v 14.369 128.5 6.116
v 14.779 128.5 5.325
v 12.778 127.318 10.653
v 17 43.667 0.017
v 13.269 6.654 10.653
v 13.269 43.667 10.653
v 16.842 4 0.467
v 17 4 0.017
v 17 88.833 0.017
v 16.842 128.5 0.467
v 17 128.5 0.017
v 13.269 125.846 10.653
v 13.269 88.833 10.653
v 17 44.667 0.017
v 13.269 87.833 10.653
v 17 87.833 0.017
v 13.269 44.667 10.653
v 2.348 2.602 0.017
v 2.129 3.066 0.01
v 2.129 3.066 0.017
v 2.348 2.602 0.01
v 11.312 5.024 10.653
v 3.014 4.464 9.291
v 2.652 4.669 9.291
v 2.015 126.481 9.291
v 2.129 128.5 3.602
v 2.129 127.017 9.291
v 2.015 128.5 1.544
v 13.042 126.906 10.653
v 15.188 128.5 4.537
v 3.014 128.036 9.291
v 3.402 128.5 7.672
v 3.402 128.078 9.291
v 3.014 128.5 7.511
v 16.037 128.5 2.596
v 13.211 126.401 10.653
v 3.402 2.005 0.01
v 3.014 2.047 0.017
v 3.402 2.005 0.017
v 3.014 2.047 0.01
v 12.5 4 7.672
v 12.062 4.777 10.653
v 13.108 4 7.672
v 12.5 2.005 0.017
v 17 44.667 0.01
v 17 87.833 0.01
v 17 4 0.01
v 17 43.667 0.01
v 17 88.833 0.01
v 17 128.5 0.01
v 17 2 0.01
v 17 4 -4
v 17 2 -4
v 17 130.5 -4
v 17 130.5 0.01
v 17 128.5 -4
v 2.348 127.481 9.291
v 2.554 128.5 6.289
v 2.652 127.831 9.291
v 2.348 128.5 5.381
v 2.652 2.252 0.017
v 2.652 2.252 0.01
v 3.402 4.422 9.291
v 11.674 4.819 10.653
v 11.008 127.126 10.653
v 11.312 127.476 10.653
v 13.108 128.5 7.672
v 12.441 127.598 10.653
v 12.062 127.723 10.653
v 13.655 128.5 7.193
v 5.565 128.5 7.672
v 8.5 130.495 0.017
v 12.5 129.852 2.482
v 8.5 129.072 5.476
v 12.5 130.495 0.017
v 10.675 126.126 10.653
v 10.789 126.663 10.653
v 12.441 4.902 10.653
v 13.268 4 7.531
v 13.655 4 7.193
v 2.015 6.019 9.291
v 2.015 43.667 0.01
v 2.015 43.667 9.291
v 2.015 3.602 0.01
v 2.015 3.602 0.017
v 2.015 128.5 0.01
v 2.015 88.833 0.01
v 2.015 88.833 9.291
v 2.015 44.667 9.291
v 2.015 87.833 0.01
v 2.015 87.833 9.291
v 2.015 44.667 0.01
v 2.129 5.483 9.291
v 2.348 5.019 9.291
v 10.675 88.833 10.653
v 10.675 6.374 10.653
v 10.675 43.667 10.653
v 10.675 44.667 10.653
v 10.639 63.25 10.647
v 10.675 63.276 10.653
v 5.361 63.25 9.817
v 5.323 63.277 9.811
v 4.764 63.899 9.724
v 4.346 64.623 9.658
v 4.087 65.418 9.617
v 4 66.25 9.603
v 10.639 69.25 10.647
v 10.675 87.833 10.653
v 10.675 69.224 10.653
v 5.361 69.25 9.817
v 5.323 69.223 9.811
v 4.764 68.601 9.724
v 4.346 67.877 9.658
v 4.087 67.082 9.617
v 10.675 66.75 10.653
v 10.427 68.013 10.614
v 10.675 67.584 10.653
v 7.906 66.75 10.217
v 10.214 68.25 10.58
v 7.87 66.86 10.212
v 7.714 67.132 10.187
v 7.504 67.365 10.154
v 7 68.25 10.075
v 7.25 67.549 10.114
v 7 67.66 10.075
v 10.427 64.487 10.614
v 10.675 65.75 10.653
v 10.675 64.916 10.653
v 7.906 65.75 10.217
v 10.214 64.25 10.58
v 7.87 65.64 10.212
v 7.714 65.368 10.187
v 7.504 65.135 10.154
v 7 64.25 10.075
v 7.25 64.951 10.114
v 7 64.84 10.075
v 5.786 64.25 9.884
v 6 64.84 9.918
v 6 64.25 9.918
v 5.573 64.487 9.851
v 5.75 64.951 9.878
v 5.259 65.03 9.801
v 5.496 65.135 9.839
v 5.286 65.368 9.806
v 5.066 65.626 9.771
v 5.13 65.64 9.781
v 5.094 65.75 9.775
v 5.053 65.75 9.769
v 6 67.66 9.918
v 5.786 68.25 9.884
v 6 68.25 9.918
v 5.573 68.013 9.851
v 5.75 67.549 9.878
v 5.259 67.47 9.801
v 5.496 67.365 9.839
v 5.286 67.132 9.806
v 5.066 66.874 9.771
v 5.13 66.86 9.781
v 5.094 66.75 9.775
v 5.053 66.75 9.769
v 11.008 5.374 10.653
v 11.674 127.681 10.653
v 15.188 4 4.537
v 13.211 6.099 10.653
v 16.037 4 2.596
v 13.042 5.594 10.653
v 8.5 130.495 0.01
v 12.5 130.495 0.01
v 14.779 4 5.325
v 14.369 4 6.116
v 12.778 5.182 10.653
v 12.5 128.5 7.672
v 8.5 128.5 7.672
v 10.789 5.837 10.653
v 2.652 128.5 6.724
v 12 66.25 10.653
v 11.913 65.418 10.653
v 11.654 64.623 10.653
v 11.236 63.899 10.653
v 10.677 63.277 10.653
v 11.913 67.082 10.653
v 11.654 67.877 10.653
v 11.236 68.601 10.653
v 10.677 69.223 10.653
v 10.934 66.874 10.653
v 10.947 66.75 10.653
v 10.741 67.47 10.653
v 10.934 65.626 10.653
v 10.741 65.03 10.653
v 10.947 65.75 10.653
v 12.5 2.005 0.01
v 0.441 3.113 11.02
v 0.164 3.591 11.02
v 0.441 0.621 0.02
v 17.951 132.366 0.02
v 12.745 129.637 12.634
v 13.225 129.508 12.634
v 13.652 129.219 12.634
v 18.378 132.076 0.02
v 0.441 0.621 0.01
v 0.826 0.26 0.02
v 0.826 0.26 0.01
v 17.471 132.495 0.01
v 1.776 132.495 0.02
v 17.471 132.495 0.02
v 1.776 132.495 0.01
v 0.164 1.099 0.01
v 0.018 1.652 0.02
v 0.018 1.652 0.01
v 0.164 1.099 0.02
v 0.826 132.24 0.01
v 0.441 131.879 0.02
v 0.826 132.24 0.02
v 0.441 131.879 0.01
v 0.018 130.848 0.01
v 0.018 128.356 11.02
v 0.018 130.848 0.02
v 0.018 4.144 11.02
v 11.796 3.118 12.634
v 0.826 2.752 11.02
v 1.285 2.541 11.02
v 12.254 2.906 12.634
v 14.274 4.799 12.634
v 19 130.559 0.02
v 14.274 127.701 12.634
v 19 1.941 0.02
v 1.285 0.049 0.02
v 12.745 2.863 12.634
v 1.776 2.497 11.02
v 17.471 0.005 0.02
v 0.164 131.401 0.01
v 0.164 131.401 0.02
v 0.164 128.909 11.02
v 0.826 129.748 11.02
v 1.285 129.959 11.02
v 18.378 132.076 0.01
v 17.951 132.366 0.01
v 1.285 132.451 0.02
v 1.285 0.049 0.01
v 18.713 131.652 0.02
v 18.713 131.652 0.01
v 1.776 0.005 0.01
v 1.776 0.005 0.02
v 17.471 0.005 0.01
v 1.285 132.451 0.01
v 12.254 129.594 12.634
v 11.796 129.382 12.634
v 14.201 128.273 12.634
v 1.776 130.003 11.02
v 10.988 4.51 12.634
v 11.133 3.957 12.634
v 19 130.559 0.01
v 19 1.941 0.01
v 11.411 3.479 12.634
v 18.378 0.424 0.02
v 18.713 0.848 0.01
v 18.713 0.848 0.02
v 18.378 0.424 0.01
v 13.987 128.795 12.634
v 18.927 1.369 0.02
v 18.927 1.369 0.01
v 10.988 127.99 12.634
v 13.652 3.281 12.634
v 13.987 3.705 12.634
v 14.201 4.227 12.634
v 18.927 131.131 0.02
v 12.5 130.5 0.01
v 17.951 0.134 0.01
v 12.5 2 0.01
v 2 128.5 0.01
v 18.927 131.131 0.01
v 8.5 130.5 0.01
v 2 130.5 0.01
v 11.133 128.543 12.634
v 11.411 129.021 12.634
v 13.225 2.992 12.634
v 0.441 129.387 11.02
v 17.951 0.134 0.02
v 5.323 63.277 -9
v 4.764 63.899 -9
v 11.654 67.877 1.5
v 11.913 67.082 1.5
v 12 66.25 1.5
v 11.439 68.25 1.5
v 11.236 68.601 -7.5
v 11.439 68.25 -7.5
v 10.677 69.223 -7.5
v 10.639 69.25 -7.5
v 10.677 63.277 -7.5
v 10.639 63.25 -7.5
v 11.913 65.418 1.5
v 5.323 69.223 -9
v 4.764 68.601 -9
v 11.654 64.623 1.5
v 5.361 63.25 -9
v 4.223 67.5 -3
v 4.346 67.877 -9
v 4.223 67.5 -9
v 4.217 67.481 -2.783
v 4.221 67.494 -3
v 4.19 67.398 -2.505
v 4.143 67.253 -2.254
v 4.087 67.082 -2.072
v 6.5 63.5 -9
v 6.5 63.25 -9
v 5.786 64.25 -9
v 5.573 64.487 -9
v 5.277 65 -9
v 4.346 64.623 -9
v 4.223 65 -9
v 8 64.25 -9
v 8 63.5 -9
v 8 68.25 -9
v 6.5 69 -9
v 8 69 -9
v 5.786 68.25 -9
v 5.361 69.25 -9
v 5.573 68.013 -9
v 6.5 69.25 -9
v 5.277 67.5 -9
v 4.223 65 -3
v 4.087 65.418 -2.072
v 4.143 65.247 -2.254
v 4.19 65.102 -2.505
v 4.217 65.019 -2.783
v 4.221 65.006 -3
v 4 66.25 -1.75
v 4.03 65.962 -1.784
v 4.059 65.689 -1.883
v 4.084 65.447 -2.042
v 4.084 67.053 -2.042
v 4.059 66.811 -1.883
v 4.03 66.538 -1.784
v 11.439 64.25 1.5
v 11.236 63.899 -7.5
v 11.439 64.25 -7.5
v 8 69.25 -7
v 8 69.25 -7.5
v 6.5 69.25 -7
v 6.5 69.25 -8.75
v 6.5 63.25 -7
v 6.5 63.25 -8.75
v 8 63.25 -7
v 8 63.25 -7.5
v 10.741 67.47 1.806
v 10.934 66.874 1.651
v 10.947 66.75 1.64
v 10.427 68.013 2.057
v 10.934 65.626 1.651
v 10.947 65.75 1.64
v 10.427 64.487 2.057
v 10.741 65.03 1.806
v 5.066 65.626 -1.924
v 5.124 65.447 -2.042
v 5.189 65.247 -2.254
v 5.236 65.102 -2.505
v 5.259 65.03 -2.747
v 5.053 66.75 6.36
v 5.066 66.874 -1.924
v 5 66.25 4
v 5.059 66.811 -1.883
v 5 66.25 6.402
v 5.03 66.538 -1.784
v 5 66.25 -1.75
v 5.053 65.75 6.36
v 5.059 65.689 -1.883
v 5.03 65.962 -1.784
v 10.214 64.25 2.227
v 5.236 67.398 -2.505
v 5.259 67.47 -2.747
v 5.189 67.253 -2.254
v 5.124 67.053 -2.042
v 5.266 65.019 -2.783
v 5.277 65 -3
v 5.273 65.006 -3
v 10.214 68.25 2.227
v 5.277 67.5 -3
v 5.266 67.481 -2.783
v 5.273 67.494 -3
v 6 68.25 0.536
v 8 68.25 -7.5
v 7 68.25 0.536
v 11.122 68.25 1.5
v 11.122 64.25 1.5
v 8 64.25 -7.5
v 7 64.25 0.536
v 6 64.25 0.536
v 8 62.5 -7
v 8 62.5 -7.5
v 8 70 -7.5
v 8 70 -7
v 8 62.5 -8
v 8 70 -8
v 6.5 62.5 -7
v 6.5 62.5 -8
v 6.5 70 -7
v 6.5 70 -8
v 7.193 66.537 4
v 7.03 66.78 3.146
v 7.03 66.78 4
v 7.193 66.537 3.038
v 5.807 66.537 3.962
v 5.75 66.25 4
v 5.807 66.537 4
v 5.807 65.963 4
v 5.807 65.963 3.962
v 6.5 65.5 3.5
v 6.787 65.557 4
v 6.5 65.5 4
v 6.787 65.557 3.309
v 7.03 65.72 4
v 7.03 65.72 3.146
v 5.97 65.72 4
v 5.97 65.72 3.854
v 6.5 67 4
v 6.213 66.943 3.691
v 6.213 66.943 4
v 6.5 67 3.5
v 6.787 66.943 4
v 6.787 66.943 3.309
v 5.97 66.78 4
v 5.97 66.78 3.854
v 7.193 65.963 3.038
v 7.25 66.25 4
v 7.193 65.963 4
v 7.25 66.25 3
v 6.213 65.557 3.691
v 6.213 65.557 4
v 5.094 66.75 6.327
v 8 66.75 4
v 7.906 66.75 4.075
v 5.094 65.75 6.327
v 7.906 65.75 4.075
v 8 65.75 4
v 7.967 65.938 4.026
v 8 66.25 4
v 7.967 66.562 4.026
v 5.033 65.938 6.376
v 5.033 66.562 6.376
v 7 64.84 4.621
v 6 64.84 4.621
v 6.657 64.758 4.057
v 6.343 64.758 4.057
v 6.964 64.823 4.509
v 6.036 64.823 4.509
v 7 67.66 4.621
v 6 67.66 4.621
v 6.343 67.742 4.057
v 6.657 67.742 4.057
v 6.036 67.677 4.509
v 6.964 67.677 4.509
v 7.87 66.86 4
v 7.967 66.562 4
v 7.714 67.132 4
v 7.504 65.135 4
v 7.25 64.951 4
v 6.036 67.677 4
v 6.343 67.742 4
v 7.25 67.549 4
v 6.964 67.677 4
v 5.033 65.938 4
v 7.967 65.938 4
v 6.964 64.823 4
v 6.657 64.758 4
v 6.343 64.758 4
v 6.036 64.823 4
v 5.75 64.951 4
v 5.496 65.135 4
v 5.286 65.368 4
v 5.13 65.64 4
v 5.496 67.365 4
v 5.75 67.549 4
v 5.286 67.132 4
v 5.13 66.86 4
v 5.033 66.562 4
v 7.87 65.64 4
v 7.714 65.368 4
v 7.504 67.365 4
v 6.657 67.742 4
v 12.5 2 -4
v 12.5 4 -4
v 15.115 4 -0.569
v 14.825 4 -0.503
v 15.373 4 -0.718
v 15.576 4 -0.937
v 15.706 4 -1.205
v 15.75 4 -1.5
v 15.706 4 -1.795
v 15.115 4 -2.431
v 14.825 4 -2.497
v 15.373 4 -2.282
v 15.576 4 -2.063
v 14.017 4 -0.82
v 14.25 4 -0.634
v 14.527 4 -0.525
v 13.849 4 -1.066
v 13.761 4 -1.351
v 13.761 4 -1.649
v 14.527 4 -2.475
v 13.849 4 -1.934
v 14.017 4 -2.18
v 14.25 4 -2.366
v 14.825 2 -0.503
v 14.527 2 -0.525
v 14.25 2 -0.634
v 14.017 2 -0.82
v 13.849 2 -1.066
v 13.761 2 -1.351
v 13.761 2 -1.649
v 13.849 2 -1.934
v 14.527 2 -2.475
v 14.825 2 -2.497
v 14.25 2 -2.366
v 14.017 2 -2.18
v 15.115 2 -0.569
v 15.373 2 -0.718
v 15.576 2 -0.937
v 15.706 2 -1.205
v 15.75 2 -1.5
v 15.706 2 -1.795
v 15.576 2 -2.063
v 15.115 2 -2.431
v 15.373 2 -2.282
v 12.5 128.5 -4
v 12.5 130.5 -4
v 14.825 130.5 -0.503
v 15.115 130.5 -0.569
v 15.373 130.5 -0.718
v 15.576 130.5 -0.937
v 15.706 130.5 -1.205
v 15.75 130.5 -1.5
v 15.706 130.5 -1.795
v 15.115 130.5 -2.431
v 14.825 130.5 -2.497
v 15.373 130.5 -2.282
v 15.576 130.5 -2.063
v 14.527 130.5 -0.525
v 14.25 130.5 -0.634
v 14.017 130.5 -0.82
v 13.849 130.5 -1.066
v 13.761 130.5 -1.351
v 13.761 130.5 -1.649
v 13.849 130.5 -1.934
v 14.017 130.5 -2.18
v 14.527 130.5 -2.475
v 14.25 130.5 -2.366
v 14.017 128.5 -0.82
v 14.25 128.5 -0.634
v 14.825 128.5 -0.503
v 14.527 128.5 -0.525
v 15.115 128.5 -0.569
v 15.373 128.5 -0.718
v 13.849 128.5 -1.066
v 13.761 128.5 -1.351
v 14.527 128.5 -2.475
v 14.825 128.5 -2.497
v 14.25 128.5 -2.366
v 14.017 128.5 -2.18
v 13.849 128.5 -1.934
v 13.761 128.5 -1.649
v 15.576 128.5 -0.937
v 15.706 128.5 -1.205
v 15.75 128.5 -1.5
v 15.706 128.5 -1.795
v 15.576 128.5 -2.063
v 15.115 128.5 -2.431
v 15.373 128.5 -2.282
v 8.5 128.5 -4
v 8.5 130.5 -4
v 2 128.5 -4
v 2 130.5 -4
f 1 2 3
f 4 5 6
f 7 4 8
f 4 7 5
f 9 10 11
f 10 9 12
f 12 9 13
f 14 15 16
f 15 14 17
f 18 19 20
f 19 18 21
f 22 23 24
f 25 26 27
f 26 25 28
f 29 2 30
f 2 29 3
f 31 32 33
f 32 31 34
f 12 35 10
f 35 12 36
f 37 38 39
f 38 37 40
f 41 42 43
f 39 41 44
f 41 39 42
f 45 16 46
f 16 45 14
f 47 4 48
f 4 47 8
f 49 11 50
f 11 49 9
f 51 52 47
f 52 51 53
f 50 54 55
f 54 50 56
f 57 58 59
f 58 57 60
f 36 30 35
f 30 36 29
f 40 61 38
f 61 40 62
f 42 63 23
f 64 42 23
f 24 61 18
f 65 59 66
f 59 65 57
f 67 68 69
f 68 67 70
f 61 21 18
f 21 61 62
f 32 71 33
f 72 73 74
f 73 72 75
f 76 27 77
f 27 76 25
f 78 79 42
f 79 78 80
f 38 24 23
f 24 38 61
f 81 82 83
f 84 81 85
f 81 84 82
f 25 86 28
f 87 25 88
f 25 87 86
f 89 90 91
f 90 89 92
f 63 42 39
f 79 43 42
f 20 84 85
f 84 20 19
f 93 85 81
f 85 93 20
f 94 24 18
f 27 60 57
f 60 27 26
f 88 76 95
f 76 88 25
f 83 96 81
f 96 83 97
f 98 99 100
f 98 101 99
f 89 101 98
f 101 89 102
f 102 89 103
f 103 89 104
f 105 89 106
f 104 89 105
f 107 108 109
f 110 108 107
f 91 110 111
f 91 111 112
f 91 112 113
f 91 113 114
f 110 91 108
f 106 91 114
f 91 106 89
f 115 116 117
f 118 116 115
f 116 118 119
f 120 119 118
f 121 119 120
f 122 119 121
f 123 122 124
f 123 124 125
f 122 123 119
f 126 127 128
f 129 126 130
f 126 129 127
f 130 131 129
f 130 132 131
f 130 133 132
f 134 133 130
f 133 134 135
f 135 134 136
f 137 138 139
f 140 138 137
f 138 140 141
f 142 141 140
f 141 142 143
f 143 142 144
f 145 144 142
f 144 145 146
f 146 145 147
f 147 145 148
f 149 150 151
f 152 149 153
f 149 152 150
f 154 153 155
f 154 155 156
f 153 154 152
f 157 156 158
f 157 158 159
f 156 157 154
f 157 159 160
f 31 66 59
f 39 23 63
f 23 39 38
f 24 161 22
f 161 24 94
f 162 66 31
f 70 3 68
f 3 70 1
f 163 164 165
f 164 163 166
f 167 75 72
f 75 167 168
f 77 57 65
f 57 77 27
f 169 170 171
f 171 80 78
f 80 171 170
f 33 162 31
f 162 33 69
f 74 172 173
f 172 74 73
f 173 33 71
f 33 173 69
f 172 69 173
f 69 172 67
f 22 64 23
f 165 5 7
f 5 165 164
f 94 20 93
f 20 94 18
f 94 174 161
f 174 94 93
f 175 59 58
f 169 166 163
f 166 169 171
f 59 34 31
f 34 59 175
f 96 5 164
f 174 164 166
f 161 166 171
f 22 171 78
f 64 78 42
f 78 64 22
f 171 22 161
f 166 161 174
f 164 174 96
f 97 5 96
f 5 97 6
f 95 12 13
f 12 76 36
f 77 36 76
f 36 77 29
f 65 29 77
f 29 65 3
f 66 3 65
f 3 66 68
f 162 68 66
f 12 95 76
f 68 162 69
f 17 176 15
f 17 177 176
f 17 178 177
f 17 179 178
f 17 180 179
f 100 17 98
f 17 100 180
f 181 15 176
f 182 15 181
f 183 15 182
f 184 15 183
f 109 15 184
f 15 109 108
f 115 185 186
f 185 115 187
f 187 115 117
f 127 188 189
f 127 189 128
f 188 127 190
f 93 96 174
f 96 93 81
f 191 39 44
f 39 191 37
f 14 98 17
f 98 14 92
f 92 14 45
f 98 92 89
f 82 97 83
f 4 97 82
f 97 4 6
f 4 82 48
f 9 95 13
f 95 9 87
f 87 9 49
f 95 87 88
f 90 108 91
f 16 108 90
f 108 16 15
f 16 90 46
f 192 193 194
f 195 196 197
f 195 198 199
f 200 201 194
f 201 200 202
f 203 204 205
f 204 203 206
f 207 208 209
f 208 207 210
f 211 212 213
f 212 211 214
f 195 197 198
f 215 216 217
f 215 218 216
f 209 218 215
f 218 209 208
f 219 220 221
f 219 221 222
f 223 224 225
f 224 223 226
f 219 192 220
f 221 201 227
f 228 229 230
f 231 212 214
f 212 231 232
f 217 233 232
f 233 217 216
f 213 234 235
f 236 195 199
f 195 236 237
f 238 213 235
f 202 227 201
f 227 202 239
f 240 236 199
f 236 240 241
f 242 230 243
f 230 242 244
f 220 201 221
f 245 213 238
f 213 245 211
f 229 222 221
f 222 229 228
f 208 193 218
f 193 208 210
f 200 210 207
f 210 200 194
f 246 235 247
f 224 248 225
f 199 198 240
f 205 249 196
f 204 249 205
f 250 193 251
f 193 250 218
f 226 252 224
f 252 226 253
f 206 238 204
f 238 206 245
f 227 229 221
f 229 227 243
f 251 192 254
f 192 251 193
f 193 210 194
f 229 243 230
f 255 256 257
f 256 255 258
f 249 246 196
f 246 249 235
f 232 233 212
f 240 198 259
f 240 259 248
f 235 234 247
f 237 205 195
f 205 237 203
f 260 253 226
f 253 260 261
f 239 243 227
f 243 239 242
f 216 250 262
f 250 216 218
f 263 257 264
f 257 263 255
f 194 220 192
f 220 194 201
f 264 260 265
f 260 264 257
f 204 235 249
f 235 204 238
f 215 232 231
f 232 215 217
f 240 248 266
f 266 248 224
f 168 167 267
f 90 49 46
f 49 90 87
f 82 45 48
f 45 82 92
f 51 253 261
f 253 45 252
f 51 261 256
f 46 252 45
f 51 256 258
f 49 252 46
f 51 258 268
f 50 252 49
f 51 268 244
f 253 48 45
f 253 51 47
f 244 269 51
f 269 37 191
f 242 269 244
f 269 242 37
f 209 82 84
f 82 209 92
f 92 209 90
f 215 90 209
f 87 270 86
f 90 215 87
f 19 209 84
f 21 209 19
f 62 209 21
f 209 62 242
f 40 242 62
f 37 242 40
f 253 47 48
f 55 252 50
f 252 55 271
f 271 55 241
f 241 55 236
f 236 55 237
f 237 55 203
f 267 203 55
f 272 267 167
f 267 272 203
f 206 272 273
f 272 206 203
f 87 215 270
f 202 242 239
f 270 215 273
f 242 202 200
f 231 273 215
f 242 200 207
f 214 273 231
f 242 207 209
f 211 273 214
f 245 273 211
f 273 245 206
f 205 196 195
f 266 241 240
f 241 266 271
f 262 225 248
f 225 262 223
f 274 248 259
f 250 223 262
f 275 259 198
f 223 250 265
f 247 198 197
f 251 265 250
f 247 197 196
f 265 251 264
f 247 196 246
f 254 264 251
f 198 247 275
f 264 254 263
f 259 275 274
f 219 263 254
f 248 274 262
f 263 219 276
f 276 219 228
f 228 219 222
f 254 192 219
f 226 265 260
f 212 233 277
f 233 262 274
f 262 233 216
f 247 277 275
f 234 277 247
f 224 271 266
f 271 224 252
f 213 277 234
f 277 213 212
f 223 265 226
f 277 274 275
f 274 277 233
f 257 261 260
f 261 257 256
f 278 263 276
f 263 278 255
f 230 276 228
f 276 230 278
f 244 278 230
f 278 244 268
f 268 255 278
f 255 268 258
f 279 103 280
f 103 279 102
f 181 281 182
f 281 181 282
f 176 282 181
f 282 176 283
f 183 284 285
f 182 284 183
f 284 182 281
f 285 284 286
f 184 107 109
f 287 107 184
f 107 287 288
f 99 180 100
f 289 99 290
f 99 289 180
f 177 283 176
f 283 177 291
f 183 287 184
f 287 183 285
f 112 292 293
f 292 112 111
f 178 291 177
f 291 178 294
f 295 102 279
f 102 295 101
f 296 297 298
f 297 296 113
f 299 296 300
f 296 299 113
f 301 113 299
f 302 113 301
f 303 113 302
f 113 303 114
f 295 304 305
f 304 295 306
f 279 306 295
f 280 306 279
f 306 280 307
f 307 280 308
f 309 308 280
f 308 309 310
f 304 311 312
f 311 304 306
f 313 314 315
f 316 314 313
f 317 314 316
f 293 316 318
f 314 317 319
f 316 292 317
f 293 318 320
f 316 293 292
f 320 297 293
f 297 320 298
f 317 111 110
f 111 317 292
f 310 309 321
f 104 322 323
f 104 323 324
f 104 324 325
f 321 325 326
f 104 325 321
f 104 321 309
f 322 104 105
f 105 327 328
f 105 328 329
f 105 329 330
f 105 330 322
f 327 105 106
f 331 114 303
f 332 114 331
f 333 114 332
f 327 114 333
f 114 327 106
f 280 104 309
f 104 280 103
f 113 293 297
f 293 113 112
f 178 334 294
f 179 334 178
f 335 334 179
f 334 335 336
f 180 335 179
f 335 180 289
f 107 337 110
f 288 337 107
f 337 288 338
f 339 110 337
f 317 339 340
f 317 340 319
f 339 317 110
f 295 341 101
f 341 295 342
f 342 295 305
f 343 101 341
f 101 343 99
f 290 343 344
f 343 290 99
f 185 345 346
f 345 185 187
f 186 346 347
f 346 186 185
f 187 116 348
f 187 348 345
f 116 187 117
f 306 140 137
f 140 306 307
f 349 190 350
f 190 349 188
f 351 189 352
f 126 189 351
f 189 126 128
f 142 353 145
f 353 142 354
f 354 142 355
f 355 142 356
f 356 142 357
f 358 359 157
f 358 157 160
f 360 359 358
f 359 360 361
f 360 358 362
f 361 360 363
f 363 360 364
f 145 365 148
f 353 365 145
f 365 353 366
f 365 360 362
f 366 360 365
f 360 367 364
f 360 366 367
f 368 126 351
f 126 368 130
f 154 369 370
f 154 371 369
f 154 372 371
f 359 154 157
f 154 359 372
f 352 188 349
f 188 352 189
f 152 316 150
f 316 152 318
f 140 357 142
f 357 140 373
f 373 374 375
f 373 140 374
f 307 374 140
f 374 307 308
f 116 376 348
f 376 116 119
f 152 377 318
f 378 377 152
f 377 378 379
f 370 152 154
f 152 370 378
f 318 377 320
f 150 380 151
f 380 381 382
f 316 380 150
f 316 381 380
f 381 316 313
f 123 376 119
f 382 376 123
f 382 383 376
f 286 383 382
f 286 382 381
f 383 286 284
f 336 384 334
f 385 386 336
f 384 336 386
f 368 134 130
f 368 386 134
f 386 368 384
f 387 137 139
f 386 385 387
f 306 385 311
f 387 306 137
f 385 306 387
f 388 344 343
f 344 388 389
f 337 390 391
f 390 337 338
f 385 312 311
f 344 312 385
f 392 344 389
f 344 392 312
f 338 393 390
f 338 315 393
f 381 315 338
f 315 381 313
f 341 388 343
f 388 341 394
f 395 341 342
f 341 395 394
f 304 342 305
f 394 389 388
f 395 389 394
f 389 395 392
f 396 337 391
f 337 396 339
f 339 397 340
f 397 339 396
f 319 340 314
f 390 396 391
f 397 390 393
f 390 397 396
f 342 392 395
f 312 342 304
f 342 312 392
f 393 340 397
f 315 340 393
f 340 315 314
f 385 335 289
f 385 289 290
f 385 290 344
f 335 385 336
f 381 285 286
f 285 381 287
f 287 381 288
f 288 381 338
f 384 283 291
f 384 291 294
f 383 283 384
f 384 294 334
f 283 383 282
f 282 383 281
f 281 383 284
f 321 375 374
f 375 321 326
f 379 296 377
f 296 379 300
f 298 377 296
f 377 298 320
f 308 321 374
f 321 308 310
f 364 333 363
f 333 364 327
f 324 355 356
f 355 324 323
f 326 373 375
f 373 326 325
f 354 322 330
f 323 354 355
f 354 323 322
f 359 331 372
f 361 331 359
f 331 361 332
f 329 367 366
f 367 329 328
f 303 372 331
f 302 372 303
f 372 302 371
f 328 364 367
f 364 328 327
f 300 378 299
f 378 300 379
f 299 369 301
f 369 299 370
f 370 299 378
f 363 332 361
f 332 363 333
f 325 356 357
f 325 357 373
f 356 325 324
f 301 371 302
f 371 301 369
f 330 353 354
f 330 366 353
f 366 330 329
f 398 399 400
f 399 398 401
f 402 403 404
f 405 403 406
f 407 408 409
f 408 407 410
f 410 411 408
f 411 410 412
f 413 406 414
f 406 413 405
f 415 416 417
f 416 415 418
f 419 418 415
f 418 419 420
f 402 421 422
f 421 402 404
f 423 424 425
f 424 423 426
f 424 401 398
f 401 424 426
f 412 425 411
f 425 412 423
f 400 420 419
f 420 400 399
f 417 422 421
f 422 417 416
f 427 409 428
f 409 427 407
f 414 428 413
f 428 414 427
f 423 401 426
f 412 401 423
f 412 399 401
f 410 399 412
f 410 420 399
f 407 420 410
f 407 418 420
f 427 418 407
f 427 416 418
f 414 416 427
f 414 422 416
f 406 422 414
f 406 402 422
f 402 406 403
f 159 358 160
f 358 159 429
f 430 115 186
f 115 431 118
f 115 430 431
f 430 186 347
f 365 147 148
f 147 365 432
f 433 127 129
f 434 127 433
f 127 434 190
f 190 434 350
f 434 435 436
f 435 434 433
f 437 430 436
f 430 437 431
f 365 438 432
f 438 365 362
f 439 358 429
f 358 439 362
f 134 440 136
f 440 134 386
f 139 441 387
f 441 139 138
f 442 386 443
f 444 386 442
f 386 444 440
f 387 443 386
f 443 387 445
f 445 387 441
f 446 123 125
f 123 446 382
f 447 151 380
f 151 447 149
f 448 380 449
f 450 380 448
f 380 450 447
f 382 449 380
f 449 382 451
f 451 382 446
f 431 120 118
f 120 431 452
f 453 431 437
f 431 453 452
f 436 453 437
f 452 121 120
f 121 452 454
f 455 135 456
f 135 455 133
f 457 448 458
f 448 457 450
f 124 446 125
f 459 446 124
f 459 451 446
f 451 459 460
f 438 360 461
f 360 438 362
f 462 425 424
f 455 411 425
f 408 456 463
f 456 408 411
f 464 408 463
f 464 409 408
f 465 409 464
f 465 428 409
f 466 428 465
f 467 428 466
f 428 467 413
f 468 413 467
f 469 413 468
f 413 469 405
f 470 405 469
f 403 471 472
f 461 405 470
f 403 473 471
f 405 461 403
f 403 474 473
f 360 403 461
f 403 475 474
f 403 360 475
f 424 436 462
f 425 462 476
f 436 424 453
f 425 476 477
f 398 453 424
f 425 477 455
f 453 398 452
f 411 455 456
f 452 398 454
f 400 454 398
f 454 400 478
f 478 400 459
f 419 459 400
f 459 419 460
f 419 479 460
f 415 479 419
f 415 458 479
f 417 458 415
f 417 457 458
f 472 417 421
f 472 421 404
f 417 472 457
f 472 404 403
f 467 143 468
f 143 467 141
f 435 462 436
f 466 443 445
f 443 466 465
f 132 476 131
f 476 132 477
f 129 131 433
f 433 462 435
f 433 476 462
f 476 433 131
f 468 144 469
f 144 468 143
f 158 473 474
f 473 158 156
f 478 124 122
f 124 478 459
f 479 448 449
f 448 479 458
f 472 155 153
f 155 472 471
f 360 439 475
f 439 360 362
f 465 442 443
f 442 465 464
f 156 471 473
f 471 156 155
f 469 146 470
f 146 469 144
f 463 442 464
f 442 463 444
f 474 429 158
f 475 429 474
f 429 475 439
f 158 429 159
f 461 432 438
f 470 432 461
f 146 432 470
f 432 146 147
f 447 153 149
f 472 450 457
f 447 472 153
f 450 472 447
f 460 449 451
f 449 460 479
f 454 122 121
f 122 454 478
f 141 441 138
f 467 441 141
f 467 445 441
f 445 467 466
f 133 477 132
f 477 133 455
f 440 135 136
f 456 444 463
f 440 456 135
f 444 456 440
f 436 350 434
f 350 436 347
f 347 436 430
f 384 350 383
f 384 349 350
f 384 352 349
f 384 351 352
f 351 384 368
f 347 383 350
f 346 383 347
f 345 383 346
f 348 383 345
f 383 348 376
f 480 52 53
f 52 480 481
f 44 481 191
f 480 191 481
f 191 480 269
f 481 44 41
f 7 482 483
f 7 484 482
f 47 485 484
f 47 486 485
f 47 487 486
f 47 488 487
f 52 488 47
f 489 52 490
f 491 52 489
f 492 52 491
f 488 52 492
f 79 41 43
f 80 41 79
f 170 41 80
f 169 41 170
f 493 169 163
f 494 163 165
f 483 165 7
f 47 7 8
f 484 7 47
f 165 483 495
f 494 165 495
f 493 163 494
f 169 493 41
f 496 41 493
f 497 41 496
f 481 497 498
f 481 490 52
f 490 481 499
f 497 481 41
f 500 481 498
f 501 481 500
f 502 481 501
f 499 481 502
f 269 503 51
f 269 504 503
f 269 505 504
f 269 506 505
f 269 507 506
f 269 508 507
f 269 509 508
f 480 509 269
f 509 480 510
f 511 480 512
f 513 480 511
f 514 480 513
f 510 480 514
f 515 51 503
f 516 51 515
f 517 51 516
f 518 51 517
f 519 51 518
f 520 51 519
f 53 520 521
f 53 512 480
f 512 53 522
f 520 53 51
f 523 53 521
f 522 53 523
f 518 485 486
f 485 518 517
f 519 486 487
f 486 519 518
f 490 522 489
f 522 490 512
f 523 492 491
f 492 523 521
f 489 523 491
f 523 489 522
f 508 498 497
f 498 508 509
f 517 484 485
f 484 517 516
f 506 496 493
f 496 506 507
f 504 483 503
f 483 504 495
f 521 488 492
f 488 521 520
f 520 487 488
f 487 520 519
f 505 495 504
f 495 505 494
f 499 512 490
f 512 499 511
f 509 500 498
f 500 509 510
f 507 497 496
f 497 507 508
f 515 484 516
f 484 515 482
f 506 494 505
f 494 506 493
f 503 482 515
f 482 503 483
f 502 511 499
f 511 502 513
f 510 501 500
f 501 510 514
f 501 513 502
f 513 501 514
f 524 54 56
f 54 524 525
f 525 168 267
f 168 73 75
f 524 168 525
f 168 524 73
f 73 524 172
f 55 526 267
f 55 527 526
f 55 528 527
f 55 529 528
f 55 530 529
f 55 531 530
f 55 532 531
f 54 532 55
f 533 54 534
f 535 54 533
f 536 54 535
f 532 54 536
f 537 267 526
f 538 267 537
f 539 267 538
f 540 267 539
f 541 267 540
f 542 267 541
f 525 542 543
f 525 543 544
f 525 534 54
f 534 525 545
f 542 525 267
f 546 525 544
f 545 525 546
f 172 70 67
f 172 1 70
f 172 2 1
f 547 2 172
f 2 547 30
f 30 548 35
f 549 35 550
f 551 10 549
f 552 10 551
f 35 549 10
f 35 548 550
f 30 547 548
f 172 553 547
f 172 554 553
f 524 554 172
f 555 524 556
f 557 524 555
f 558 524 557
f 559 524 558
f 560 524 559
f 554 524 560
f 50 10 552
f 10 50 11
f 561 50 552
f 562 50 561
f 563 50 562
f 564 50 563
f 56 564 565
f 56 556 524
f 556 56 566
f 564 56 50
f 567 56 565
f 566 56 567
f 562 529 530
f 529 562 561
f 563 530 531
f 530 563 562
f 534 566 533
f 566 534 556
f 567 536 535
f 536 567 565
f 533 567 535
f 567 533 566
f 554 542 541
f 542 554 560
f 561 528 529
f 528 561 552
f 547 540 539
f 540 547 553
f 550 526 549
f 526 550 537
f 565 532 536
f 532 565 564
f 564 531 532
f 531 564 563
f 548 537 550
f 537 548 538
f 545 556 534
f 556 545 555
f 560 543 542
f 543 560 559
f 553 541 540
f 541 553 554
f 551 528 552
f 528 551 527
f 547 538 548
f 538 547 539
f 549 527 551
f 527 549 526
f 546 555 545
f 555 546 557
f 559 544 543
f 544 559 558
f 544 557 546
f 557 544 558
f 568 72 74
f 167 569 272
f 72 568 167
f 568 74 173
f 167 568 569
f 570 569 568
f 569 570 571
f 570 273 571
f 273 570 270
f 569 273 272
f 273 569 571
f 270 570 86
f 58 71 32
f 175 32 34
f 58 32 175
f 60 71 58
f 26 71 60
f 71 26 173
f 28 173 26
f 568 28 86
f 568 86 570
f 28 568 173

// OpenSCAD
//measures are in millimeters
//(feel free to cocnvert them to attoparsecs)
AY=132.5;
AX=19.0;
BY=127.5;
BLX=14.5;
EZ=11.0;
FLZ=14.0;
H=12.75;
SHAFT_OFF_Y=AY/2;
SHAFT_OFF_X=8.0; //???
CLIP_X=2;
CLIP_Y=0.75;
CLIP_H=3*CLIP_Y;
CORNER_RADIUS=2;
SHAFT_X=8.0;
SHAFT_Y=6.0;
SHAFT_LENGTH=9.0;
SHAFT_THICKNESS=1.0;
SHAFT_CLIP_WIDTH=3.0;
SHAFT_CLIP_THICKNESS=0.75;
SHAFT_CLIP_HEIGHT=2.0;
SHAFT_CLIP_SLOPE_DEPTH=1.0;
SHAFT_CLIP_ANGLE=45;
SHAFT_END_CUTOUT_HEIGHT=1.5;
SHAFT_LARGE_SLOT_TO_BASE=1.5;
SHAFT_SMALL_SLOT_LENGTH=7.25;
SHAFT_SMALL_SLOT_WIDTH=2.5;
SHAFT_SPRING_HOLDER_WIDTH=3.0;
SHAFT_SPRING_HOLDER_TO_BASE=4.0;
SHAFT_SPRING_GUIDE_WIDTH=1.0;
SHAFT_SPRING_GUIDE_SIDES_HEIGHT=3.5;
STRUT_THICKNESS=1;
STRUT_HEIGHT=3;
STRUT_SPACING=1;
SHAFT_SPRING_HOLDER_NIPPLE_HEIGHT=1;
SHAFT_SPRING_HOLDER_NIPPLE_RADIUS=0.75;

WIRE_HOLDER_HEIGHT=4.0;
WIRE_HOLDER_WIDTH=4.5;
WIRE_DIAMETER=2.0;
WIRE_HOLE_OFF_Z=0.5;

MYSTERIOUS_TAB_WIDTH=6.5;
MYSTERIOUS_TAB_HEIGHT=5.5;

SHAFT_SMALL_SLOT_BEVEL=0.5;

WallThickness=2.0;
ClipWidth=2.2;
ClipDepth=0.75;

//ascfront=FLZ/sqrt(pow(FLZ,2)-pow(H,2));
//asctop=(H-EZ)/sqrt(pow(BLX,2)-pow((H-EZ),2));

alpha=asin((H-EZ)/BLX);
beta=asin(H/FLZ);
gamma=90-asin((0.5*(AY-BY))/EZ);

module keycap(){
	scale([AX/(AX+2*CORNER_RADIUS),AY/(AY+2*CORNER_RADIUS),1])
	translate([CORNER_RADIUS,CORNER_RADIUS,0.01])
	minkowski(){
		difference(){
			cube([AX,AY,H]);
			rotate(a=gamma,v=[1,0,0]) cube([200,200,200]);
			translate([0,AY,0]) rotate(a=90-gamma,v=[1,0,0]) cube([200,200,200]);
			translate([0,0,EZ]) rotate(a=-alpha,v=[0,1,0]) translate([-100,0,0]) cube([200,200,200]);
			translate([AX,0,0]) rotate(a=beta-90,v=[0,1,0]) cube([200,200,200]);
		}
		cylinder(h=0.01,r=CORNER_RADIUS,$fs=0.6);
		//rotate(a=90,v=[1,0,0]) cylinder(h=0.01,r=1,$fs=0.3);
	}
}

module shaft(){
	spring_guide_length = SHAFT_X-SHAFT_THICKNESS-SHAFT_SPRING_HOLDER_WIDTH;
	spring_guide_height = SHAFT_SPRING_HOLDER_TO_BASE-SHAFT_LARGE_SLOT_TO_BASE;
	translate([0,0,-SHAFT_LENGTH]) difference(){
		union(){
			difference(){
				union(){
					difference(){
						intersection(){
							cylinder(h=200,r=SHAFT_X/2,$fs=0.3);
							translate([-SHAFT_X/2,-SHAFT_Y/2,0]) cube([SHAFT_X,SHAFT_Y,200]);
						}
						intersection(){
							cylinder(h=200,r=SHAFT_X/2-SHAFT_THICKNESS,$fs=0.3);
							translate([-SHAFT_X/2+SHAFT_THICKNESS,-SHAFT_Y/2+SHAFT_THICKNESS,0]) cube([SHAFT_X-2*SHAFT_THICKNESS,SHAFT_Y-2*SHAFT_THICKNESS,200]);
						}
					}
					translate([-SHAFT_CLIP_WIDTH/2, -SHAFT_CLIP_THICKNESS-SHAFT_Y/2,0]) cube([SHAFT_CLIP_WIDTH/2, SHAFT_CLIP_THICKNESS,SHAFT_CLIP_HEIGHT]);
					translate([-SHAFT_CLIP_WIDTH/2, SHAFT_Y/2,0]) cube([SHAFT_CLIP_WIDTH/2, SHAFT_CLIP_THICKNESS,SHAFT_CLIP_HEIGHT]);
				}
				translate([-SHAFT_CLIP_WIDTH/2, -SHAFT_CLIP_THICKNESS-SHAFT_Y/2+SHAFT_CLIP_SLOPE_DEPTH,0]) rotate(a=90+SHAFT_CLIP_ANGLE,v=[1,0,0]) cube([SHAFT_CLIP_WIDTH/2,200,200]);
				translate([-SHAFT_CLIP_WIDTH/2, SHAFT_Y/2+SHAFT_CLIP_THICKNESS-SHAFT_CLIP_SLOPE_DEPTH,0]) mirror([0,1,0]) rotate(a=90+SHAFT_CLIP_ANGLE,v=[1,0,0]) cube([SHAFT_CLIP_WIDTH/2,200,200]);
				translate([0,-100,0]) cube([200,200,SHAFT_END_CUTOUT_HEIGHT]);
				translate([0,-SHAFT_Y/2+SHAFT_THICKNESS,0]) cube([200,SHAFT_Y-SHAFT_THICKNESS*2,SHAFT_LENGTH+SHAFT_LARGE_SLOT_TO_BASE]);
				//small slot cutout
				translate([0,-SHAFT_SMALL_SLOT_WIDTH/2,0]){
					mirror([1,0,0]) cube([200,SHAFT_SMALL_SLOT_WIDTH,SHAFT_SMALL_SLOT_LENGTH-0.5*SHAFT_SMALL_SLOT_WIDTH]);
				}
				//small slot cutout
				translate([0,0,SHAFT_SMALL_SLOT_LENGTH-0.5*SHAFT_SMALL_SLOT_WIDTH]) rotate(a=-90,v=[0,1,0]) cylinder(r=SHAFT_SMALL_SLOT_WIDTH/2,h=SHAFT_X/2,$fs=0.3);
			}
			//spring holder
			translate([-SHAFT_X/2+SHAFT_SPRING_HOLDER_WIDTH/2+SHAFT_THICKNESS,0,SHAFT_LENGTH+SHAFT_SPRING_HOLDER_TO_BASE]) cylinder(r=SHAFT_SPRING_HOLDER_WIDTH/2,h=200,$fs=0.3);
			intersection(){
				translate([-SHAFT_X/2+SHAFT_SPRING_HOLDER_WIDTH/2+SHAFT_THICKNESS,0,SHAFT_LENGTH+SHAFT_SPRING_HOLDER_TO_BASE-SHAFT_SPRING_HOLDER_NIPPLE_HEIGHT]) cylinder(r=SHAFT_SPRING_HOLDER_NIPPLE_RADIUS,h=200,$fs=0.3);
				translate([0,0,SHAFT_LENGTH+SHAFT_SPRING_HOLDER_TO_BASE-SHAFT_SPRING_HOLDER_NIPPLE_HEIGHT*1.5]) rotate(v=[0,1,0], a=atan(SHAFT_SPRING_HOLDER_NIPPLE_HEIGHT/(SHAFT_SPRING_HOLDER_NIPPLE_RADIUS*2))) translate([-100,-100,0]) cube(200,200,200);
			}
			intersection(){
				difference(){
					translate([SHAFT_X/2-SHAFT_THICKNESS,-0.5*SHAFT_SPRING_GUIDE_WIDTH,SHAFT_LENGTH+SHAFT_LARGE_SLOT_TO_BASE]) mirror([1,0,0]) cube([200,SHAFT_SPRING_GUIDE_WIDTH,200]);
					translate([-SHAFT_X/2+SHAFT_SPRING_HOLDER_WIDTH+SHAFT_THICKNESS,-0.5*SHAFT_SPRING_GUIDE_WIDTH,SHAFT_LENGTH+SHAFT_SPRING_HOLDER_TO_BASE])
					mirror([1,0,0]) rotate(a=90-asin(spring_guide_height/spring_guide_length),v=[0,1,0]) mirror([0,0,1]) translate([0,0,-100]) cube([200,SHAFT_SPRING_GUIDE_WIDTH,200]);
				}
				cube([SHAFT_X-SHAFT_THICKNESS,SHAFT_Y,200],center=true);
			}
			//side spring guides
			difference(){
				translate([-SHAFT_X/2+SHAFT_THICKNESS+(SHAFT_SPRING_HOLDER_WIDTH-SHAFT_SPRING_GUIDE_WIDTH)/2,-SHAFT_Y/2+SHAFT_THICKNESS,SHAFT_LENGTH+SHAFT_SPRING_HOLDER_TO_BASE-SHAFT_SPRING_GUIDE_SIDES_HEIGHT]) cube([SHAFT_SPRING_GUIDE_WIDTH,SHAFT_Y-2*SHAFT_THICKNESS,EZ-SHAFT_SPRING_HOLDER_TO_BASE+SHAFT_SPRING_GUIDE_SIDES_HEIGHT]);
				translate([-SHAFT_X/2+SHAFT_THICKNESS+(SHAFT_SPRING_HOLDER_WIDTH-SHAFT_SPRING_GUIDE_WIDTH)/2,-SHAFT_SPRING_HOLDER_WIDTH/2,SHAFT_LENGTH+SHAFT_SPRING_HOLDER_TO_BASE]) rotate(a=-asin(((SHAFT_Y-SHAFT_SPRING_HOLDER_WIDTH)/2-SHAFT_THICKNESS)/SHAFT_SPRING_GUIDE_SIDES_HEIGHT),v=[1,0,0]) translate([0,0,-100]) cube([SHAFT_SPRING_GUIDE_WIDTH,200,200]);
			}
			difference(){
				translate([-SHAFT_X/2+SHAFT_THICKNESS+(SHAFT_SPRING_HOLDER_WIDTH-SHAFT_SPRING_GUIDE_WIDTH)/2,-SHAFT_Y/2+SHAFT_THICKNESS,SHAFT_LENGTH+SHAFT_SPRING_HOLDER_TO_BASE-SHAFT_SPRING_GUIDE_SIDES_HEIGHT]) cube([SHAFT_SPRING_GUIDE_WIDTH,SHAFT_Y-2*SHAFT_THICKNESS,EZ-SHAFT_SPRING_HOLDER_TO_BASE+SHAFT_SPRING_GUIDE_SIDES_HEIGHT]);
				mirror([0,1,0]) translate([-SHAFT_X/2+SHAFT_THICKNESS+(SHAFT_SPRING_HOLDER_WIDTH-SHAFT_SPRING_GUIDE_WIDTH)/2,-SHAFT_SPRING_HOLDER_WIDTH/2,SHAFT_LENGTH+SHAFT_SPRING_HOLDER_TO_BASE]) rotate(a=-asin(((SHAFT_Y-SHAFT_SPRING_HOLDER_WIDTH)/2-SHAFT_THICKNESS)/SHAFT_SPRING_GUIDE_SIDES_HEIGHT),v=[1,0,0]) translate([0,0,-100]) cube([SHAFT_SPRING_GUIDE_WIDTH,200,200]);
			}
		}
		translate([-SHAFT_X/2+SHAFT_SPRING_HOLDER_WIDTH+SHAFT_THICKNESS,-SHAFT_Y/2+SHAFT_THICKNESS,SHAFT_LENGTH+SHAFT_SPRING_HOLDER_TO_BASE]) mirror([1,0,0]) rotate(a=90-asin(spring_guide_height/spring_guide_length),v=[0,1,0]) mirror([0,0,1]) cube([SHAFT_THICKNESS,SHAFT_Y-2*SHAFT_THICKNESS,200]);
	}
}

difference(){
	keycap();
	difference(){
		translate([WallThickness, WallThickness, 0]) scale(v=[1-2*WallThickness/AX, 1-2*WallThickness/AY, 1-WallThickness/H]) keycap();
		translate([0,AY/3,0]) cube([200,STRUT_THICKNESS,200],center=true);
		translate([0,2*AY/3,0]) cube([200,STRUT_THICKNESS,200],center=true);
	}
}
intersection(){
	union(){
		translate([WallThickness, WallThickness, 0]) scale(v=[1-2*WallThickness/AX, 1-2*WallThickness/AY, 1-WallThickness/H]) keycap();
		translate([-200,-200,-399.9]) cube([400,400,400]);
	}
	union(){
		translate([SHAFT_OFF_X,SHAFT_OFF_Y]) shaft();
		translate([AX-WIRE_HOLDER_WIDTH-WallThickness, WallThickness, -WIRE_HOLDER_HEIGHT]) difference(){
			cube([WIRE_HOLDER_WIDTH,WallThickness,WIRE_HOLDER_HEIGHT+H]);
			translate([WIRE_HOLDER_WIDTH/2,WallThickness*1.5,WIRE_HOLDER_HEIGHT-WIRE_DIAMETER/2-WIRE_HOLE_OFF_Z]) rotate([90,0,0]) cylinder(r=WIRE_DIAMETER/2,h=WallThickness*2,$fs=0.3);
		}
		translate([AX-WIRE_HOLDER_WIDTH-WallThickness, AY-2*WallThickness, -WIRE_HOLDER_HEIGHT]) difference(){
			cube([WIRE_HOLDER_WIDTH,WallThickness,WIRE_HOLDER_HEIGHT+H]);
			translate([WIRE_HOLDER_WIDTH/2,WallThickness*1.5,WIRE_HOLDER_HEIGHT-WIRE_DIAMETER/2-WIRE_HOLE_OFF_Z]) rotate([90,0,0]) cylinder(r=WIRE_DIAMETER/2,h=WallThickness*2,$fs=0.3);
		}
		translate([WallThickness, AY-2*WallThickness, -WIRE_HOLDER_HEIGHT]) cube([MYSTERIOUS_TAB_WIDTH,WallThickness,H+MYSTERIOUS_TAB_HEIGHT]);
	}
}
